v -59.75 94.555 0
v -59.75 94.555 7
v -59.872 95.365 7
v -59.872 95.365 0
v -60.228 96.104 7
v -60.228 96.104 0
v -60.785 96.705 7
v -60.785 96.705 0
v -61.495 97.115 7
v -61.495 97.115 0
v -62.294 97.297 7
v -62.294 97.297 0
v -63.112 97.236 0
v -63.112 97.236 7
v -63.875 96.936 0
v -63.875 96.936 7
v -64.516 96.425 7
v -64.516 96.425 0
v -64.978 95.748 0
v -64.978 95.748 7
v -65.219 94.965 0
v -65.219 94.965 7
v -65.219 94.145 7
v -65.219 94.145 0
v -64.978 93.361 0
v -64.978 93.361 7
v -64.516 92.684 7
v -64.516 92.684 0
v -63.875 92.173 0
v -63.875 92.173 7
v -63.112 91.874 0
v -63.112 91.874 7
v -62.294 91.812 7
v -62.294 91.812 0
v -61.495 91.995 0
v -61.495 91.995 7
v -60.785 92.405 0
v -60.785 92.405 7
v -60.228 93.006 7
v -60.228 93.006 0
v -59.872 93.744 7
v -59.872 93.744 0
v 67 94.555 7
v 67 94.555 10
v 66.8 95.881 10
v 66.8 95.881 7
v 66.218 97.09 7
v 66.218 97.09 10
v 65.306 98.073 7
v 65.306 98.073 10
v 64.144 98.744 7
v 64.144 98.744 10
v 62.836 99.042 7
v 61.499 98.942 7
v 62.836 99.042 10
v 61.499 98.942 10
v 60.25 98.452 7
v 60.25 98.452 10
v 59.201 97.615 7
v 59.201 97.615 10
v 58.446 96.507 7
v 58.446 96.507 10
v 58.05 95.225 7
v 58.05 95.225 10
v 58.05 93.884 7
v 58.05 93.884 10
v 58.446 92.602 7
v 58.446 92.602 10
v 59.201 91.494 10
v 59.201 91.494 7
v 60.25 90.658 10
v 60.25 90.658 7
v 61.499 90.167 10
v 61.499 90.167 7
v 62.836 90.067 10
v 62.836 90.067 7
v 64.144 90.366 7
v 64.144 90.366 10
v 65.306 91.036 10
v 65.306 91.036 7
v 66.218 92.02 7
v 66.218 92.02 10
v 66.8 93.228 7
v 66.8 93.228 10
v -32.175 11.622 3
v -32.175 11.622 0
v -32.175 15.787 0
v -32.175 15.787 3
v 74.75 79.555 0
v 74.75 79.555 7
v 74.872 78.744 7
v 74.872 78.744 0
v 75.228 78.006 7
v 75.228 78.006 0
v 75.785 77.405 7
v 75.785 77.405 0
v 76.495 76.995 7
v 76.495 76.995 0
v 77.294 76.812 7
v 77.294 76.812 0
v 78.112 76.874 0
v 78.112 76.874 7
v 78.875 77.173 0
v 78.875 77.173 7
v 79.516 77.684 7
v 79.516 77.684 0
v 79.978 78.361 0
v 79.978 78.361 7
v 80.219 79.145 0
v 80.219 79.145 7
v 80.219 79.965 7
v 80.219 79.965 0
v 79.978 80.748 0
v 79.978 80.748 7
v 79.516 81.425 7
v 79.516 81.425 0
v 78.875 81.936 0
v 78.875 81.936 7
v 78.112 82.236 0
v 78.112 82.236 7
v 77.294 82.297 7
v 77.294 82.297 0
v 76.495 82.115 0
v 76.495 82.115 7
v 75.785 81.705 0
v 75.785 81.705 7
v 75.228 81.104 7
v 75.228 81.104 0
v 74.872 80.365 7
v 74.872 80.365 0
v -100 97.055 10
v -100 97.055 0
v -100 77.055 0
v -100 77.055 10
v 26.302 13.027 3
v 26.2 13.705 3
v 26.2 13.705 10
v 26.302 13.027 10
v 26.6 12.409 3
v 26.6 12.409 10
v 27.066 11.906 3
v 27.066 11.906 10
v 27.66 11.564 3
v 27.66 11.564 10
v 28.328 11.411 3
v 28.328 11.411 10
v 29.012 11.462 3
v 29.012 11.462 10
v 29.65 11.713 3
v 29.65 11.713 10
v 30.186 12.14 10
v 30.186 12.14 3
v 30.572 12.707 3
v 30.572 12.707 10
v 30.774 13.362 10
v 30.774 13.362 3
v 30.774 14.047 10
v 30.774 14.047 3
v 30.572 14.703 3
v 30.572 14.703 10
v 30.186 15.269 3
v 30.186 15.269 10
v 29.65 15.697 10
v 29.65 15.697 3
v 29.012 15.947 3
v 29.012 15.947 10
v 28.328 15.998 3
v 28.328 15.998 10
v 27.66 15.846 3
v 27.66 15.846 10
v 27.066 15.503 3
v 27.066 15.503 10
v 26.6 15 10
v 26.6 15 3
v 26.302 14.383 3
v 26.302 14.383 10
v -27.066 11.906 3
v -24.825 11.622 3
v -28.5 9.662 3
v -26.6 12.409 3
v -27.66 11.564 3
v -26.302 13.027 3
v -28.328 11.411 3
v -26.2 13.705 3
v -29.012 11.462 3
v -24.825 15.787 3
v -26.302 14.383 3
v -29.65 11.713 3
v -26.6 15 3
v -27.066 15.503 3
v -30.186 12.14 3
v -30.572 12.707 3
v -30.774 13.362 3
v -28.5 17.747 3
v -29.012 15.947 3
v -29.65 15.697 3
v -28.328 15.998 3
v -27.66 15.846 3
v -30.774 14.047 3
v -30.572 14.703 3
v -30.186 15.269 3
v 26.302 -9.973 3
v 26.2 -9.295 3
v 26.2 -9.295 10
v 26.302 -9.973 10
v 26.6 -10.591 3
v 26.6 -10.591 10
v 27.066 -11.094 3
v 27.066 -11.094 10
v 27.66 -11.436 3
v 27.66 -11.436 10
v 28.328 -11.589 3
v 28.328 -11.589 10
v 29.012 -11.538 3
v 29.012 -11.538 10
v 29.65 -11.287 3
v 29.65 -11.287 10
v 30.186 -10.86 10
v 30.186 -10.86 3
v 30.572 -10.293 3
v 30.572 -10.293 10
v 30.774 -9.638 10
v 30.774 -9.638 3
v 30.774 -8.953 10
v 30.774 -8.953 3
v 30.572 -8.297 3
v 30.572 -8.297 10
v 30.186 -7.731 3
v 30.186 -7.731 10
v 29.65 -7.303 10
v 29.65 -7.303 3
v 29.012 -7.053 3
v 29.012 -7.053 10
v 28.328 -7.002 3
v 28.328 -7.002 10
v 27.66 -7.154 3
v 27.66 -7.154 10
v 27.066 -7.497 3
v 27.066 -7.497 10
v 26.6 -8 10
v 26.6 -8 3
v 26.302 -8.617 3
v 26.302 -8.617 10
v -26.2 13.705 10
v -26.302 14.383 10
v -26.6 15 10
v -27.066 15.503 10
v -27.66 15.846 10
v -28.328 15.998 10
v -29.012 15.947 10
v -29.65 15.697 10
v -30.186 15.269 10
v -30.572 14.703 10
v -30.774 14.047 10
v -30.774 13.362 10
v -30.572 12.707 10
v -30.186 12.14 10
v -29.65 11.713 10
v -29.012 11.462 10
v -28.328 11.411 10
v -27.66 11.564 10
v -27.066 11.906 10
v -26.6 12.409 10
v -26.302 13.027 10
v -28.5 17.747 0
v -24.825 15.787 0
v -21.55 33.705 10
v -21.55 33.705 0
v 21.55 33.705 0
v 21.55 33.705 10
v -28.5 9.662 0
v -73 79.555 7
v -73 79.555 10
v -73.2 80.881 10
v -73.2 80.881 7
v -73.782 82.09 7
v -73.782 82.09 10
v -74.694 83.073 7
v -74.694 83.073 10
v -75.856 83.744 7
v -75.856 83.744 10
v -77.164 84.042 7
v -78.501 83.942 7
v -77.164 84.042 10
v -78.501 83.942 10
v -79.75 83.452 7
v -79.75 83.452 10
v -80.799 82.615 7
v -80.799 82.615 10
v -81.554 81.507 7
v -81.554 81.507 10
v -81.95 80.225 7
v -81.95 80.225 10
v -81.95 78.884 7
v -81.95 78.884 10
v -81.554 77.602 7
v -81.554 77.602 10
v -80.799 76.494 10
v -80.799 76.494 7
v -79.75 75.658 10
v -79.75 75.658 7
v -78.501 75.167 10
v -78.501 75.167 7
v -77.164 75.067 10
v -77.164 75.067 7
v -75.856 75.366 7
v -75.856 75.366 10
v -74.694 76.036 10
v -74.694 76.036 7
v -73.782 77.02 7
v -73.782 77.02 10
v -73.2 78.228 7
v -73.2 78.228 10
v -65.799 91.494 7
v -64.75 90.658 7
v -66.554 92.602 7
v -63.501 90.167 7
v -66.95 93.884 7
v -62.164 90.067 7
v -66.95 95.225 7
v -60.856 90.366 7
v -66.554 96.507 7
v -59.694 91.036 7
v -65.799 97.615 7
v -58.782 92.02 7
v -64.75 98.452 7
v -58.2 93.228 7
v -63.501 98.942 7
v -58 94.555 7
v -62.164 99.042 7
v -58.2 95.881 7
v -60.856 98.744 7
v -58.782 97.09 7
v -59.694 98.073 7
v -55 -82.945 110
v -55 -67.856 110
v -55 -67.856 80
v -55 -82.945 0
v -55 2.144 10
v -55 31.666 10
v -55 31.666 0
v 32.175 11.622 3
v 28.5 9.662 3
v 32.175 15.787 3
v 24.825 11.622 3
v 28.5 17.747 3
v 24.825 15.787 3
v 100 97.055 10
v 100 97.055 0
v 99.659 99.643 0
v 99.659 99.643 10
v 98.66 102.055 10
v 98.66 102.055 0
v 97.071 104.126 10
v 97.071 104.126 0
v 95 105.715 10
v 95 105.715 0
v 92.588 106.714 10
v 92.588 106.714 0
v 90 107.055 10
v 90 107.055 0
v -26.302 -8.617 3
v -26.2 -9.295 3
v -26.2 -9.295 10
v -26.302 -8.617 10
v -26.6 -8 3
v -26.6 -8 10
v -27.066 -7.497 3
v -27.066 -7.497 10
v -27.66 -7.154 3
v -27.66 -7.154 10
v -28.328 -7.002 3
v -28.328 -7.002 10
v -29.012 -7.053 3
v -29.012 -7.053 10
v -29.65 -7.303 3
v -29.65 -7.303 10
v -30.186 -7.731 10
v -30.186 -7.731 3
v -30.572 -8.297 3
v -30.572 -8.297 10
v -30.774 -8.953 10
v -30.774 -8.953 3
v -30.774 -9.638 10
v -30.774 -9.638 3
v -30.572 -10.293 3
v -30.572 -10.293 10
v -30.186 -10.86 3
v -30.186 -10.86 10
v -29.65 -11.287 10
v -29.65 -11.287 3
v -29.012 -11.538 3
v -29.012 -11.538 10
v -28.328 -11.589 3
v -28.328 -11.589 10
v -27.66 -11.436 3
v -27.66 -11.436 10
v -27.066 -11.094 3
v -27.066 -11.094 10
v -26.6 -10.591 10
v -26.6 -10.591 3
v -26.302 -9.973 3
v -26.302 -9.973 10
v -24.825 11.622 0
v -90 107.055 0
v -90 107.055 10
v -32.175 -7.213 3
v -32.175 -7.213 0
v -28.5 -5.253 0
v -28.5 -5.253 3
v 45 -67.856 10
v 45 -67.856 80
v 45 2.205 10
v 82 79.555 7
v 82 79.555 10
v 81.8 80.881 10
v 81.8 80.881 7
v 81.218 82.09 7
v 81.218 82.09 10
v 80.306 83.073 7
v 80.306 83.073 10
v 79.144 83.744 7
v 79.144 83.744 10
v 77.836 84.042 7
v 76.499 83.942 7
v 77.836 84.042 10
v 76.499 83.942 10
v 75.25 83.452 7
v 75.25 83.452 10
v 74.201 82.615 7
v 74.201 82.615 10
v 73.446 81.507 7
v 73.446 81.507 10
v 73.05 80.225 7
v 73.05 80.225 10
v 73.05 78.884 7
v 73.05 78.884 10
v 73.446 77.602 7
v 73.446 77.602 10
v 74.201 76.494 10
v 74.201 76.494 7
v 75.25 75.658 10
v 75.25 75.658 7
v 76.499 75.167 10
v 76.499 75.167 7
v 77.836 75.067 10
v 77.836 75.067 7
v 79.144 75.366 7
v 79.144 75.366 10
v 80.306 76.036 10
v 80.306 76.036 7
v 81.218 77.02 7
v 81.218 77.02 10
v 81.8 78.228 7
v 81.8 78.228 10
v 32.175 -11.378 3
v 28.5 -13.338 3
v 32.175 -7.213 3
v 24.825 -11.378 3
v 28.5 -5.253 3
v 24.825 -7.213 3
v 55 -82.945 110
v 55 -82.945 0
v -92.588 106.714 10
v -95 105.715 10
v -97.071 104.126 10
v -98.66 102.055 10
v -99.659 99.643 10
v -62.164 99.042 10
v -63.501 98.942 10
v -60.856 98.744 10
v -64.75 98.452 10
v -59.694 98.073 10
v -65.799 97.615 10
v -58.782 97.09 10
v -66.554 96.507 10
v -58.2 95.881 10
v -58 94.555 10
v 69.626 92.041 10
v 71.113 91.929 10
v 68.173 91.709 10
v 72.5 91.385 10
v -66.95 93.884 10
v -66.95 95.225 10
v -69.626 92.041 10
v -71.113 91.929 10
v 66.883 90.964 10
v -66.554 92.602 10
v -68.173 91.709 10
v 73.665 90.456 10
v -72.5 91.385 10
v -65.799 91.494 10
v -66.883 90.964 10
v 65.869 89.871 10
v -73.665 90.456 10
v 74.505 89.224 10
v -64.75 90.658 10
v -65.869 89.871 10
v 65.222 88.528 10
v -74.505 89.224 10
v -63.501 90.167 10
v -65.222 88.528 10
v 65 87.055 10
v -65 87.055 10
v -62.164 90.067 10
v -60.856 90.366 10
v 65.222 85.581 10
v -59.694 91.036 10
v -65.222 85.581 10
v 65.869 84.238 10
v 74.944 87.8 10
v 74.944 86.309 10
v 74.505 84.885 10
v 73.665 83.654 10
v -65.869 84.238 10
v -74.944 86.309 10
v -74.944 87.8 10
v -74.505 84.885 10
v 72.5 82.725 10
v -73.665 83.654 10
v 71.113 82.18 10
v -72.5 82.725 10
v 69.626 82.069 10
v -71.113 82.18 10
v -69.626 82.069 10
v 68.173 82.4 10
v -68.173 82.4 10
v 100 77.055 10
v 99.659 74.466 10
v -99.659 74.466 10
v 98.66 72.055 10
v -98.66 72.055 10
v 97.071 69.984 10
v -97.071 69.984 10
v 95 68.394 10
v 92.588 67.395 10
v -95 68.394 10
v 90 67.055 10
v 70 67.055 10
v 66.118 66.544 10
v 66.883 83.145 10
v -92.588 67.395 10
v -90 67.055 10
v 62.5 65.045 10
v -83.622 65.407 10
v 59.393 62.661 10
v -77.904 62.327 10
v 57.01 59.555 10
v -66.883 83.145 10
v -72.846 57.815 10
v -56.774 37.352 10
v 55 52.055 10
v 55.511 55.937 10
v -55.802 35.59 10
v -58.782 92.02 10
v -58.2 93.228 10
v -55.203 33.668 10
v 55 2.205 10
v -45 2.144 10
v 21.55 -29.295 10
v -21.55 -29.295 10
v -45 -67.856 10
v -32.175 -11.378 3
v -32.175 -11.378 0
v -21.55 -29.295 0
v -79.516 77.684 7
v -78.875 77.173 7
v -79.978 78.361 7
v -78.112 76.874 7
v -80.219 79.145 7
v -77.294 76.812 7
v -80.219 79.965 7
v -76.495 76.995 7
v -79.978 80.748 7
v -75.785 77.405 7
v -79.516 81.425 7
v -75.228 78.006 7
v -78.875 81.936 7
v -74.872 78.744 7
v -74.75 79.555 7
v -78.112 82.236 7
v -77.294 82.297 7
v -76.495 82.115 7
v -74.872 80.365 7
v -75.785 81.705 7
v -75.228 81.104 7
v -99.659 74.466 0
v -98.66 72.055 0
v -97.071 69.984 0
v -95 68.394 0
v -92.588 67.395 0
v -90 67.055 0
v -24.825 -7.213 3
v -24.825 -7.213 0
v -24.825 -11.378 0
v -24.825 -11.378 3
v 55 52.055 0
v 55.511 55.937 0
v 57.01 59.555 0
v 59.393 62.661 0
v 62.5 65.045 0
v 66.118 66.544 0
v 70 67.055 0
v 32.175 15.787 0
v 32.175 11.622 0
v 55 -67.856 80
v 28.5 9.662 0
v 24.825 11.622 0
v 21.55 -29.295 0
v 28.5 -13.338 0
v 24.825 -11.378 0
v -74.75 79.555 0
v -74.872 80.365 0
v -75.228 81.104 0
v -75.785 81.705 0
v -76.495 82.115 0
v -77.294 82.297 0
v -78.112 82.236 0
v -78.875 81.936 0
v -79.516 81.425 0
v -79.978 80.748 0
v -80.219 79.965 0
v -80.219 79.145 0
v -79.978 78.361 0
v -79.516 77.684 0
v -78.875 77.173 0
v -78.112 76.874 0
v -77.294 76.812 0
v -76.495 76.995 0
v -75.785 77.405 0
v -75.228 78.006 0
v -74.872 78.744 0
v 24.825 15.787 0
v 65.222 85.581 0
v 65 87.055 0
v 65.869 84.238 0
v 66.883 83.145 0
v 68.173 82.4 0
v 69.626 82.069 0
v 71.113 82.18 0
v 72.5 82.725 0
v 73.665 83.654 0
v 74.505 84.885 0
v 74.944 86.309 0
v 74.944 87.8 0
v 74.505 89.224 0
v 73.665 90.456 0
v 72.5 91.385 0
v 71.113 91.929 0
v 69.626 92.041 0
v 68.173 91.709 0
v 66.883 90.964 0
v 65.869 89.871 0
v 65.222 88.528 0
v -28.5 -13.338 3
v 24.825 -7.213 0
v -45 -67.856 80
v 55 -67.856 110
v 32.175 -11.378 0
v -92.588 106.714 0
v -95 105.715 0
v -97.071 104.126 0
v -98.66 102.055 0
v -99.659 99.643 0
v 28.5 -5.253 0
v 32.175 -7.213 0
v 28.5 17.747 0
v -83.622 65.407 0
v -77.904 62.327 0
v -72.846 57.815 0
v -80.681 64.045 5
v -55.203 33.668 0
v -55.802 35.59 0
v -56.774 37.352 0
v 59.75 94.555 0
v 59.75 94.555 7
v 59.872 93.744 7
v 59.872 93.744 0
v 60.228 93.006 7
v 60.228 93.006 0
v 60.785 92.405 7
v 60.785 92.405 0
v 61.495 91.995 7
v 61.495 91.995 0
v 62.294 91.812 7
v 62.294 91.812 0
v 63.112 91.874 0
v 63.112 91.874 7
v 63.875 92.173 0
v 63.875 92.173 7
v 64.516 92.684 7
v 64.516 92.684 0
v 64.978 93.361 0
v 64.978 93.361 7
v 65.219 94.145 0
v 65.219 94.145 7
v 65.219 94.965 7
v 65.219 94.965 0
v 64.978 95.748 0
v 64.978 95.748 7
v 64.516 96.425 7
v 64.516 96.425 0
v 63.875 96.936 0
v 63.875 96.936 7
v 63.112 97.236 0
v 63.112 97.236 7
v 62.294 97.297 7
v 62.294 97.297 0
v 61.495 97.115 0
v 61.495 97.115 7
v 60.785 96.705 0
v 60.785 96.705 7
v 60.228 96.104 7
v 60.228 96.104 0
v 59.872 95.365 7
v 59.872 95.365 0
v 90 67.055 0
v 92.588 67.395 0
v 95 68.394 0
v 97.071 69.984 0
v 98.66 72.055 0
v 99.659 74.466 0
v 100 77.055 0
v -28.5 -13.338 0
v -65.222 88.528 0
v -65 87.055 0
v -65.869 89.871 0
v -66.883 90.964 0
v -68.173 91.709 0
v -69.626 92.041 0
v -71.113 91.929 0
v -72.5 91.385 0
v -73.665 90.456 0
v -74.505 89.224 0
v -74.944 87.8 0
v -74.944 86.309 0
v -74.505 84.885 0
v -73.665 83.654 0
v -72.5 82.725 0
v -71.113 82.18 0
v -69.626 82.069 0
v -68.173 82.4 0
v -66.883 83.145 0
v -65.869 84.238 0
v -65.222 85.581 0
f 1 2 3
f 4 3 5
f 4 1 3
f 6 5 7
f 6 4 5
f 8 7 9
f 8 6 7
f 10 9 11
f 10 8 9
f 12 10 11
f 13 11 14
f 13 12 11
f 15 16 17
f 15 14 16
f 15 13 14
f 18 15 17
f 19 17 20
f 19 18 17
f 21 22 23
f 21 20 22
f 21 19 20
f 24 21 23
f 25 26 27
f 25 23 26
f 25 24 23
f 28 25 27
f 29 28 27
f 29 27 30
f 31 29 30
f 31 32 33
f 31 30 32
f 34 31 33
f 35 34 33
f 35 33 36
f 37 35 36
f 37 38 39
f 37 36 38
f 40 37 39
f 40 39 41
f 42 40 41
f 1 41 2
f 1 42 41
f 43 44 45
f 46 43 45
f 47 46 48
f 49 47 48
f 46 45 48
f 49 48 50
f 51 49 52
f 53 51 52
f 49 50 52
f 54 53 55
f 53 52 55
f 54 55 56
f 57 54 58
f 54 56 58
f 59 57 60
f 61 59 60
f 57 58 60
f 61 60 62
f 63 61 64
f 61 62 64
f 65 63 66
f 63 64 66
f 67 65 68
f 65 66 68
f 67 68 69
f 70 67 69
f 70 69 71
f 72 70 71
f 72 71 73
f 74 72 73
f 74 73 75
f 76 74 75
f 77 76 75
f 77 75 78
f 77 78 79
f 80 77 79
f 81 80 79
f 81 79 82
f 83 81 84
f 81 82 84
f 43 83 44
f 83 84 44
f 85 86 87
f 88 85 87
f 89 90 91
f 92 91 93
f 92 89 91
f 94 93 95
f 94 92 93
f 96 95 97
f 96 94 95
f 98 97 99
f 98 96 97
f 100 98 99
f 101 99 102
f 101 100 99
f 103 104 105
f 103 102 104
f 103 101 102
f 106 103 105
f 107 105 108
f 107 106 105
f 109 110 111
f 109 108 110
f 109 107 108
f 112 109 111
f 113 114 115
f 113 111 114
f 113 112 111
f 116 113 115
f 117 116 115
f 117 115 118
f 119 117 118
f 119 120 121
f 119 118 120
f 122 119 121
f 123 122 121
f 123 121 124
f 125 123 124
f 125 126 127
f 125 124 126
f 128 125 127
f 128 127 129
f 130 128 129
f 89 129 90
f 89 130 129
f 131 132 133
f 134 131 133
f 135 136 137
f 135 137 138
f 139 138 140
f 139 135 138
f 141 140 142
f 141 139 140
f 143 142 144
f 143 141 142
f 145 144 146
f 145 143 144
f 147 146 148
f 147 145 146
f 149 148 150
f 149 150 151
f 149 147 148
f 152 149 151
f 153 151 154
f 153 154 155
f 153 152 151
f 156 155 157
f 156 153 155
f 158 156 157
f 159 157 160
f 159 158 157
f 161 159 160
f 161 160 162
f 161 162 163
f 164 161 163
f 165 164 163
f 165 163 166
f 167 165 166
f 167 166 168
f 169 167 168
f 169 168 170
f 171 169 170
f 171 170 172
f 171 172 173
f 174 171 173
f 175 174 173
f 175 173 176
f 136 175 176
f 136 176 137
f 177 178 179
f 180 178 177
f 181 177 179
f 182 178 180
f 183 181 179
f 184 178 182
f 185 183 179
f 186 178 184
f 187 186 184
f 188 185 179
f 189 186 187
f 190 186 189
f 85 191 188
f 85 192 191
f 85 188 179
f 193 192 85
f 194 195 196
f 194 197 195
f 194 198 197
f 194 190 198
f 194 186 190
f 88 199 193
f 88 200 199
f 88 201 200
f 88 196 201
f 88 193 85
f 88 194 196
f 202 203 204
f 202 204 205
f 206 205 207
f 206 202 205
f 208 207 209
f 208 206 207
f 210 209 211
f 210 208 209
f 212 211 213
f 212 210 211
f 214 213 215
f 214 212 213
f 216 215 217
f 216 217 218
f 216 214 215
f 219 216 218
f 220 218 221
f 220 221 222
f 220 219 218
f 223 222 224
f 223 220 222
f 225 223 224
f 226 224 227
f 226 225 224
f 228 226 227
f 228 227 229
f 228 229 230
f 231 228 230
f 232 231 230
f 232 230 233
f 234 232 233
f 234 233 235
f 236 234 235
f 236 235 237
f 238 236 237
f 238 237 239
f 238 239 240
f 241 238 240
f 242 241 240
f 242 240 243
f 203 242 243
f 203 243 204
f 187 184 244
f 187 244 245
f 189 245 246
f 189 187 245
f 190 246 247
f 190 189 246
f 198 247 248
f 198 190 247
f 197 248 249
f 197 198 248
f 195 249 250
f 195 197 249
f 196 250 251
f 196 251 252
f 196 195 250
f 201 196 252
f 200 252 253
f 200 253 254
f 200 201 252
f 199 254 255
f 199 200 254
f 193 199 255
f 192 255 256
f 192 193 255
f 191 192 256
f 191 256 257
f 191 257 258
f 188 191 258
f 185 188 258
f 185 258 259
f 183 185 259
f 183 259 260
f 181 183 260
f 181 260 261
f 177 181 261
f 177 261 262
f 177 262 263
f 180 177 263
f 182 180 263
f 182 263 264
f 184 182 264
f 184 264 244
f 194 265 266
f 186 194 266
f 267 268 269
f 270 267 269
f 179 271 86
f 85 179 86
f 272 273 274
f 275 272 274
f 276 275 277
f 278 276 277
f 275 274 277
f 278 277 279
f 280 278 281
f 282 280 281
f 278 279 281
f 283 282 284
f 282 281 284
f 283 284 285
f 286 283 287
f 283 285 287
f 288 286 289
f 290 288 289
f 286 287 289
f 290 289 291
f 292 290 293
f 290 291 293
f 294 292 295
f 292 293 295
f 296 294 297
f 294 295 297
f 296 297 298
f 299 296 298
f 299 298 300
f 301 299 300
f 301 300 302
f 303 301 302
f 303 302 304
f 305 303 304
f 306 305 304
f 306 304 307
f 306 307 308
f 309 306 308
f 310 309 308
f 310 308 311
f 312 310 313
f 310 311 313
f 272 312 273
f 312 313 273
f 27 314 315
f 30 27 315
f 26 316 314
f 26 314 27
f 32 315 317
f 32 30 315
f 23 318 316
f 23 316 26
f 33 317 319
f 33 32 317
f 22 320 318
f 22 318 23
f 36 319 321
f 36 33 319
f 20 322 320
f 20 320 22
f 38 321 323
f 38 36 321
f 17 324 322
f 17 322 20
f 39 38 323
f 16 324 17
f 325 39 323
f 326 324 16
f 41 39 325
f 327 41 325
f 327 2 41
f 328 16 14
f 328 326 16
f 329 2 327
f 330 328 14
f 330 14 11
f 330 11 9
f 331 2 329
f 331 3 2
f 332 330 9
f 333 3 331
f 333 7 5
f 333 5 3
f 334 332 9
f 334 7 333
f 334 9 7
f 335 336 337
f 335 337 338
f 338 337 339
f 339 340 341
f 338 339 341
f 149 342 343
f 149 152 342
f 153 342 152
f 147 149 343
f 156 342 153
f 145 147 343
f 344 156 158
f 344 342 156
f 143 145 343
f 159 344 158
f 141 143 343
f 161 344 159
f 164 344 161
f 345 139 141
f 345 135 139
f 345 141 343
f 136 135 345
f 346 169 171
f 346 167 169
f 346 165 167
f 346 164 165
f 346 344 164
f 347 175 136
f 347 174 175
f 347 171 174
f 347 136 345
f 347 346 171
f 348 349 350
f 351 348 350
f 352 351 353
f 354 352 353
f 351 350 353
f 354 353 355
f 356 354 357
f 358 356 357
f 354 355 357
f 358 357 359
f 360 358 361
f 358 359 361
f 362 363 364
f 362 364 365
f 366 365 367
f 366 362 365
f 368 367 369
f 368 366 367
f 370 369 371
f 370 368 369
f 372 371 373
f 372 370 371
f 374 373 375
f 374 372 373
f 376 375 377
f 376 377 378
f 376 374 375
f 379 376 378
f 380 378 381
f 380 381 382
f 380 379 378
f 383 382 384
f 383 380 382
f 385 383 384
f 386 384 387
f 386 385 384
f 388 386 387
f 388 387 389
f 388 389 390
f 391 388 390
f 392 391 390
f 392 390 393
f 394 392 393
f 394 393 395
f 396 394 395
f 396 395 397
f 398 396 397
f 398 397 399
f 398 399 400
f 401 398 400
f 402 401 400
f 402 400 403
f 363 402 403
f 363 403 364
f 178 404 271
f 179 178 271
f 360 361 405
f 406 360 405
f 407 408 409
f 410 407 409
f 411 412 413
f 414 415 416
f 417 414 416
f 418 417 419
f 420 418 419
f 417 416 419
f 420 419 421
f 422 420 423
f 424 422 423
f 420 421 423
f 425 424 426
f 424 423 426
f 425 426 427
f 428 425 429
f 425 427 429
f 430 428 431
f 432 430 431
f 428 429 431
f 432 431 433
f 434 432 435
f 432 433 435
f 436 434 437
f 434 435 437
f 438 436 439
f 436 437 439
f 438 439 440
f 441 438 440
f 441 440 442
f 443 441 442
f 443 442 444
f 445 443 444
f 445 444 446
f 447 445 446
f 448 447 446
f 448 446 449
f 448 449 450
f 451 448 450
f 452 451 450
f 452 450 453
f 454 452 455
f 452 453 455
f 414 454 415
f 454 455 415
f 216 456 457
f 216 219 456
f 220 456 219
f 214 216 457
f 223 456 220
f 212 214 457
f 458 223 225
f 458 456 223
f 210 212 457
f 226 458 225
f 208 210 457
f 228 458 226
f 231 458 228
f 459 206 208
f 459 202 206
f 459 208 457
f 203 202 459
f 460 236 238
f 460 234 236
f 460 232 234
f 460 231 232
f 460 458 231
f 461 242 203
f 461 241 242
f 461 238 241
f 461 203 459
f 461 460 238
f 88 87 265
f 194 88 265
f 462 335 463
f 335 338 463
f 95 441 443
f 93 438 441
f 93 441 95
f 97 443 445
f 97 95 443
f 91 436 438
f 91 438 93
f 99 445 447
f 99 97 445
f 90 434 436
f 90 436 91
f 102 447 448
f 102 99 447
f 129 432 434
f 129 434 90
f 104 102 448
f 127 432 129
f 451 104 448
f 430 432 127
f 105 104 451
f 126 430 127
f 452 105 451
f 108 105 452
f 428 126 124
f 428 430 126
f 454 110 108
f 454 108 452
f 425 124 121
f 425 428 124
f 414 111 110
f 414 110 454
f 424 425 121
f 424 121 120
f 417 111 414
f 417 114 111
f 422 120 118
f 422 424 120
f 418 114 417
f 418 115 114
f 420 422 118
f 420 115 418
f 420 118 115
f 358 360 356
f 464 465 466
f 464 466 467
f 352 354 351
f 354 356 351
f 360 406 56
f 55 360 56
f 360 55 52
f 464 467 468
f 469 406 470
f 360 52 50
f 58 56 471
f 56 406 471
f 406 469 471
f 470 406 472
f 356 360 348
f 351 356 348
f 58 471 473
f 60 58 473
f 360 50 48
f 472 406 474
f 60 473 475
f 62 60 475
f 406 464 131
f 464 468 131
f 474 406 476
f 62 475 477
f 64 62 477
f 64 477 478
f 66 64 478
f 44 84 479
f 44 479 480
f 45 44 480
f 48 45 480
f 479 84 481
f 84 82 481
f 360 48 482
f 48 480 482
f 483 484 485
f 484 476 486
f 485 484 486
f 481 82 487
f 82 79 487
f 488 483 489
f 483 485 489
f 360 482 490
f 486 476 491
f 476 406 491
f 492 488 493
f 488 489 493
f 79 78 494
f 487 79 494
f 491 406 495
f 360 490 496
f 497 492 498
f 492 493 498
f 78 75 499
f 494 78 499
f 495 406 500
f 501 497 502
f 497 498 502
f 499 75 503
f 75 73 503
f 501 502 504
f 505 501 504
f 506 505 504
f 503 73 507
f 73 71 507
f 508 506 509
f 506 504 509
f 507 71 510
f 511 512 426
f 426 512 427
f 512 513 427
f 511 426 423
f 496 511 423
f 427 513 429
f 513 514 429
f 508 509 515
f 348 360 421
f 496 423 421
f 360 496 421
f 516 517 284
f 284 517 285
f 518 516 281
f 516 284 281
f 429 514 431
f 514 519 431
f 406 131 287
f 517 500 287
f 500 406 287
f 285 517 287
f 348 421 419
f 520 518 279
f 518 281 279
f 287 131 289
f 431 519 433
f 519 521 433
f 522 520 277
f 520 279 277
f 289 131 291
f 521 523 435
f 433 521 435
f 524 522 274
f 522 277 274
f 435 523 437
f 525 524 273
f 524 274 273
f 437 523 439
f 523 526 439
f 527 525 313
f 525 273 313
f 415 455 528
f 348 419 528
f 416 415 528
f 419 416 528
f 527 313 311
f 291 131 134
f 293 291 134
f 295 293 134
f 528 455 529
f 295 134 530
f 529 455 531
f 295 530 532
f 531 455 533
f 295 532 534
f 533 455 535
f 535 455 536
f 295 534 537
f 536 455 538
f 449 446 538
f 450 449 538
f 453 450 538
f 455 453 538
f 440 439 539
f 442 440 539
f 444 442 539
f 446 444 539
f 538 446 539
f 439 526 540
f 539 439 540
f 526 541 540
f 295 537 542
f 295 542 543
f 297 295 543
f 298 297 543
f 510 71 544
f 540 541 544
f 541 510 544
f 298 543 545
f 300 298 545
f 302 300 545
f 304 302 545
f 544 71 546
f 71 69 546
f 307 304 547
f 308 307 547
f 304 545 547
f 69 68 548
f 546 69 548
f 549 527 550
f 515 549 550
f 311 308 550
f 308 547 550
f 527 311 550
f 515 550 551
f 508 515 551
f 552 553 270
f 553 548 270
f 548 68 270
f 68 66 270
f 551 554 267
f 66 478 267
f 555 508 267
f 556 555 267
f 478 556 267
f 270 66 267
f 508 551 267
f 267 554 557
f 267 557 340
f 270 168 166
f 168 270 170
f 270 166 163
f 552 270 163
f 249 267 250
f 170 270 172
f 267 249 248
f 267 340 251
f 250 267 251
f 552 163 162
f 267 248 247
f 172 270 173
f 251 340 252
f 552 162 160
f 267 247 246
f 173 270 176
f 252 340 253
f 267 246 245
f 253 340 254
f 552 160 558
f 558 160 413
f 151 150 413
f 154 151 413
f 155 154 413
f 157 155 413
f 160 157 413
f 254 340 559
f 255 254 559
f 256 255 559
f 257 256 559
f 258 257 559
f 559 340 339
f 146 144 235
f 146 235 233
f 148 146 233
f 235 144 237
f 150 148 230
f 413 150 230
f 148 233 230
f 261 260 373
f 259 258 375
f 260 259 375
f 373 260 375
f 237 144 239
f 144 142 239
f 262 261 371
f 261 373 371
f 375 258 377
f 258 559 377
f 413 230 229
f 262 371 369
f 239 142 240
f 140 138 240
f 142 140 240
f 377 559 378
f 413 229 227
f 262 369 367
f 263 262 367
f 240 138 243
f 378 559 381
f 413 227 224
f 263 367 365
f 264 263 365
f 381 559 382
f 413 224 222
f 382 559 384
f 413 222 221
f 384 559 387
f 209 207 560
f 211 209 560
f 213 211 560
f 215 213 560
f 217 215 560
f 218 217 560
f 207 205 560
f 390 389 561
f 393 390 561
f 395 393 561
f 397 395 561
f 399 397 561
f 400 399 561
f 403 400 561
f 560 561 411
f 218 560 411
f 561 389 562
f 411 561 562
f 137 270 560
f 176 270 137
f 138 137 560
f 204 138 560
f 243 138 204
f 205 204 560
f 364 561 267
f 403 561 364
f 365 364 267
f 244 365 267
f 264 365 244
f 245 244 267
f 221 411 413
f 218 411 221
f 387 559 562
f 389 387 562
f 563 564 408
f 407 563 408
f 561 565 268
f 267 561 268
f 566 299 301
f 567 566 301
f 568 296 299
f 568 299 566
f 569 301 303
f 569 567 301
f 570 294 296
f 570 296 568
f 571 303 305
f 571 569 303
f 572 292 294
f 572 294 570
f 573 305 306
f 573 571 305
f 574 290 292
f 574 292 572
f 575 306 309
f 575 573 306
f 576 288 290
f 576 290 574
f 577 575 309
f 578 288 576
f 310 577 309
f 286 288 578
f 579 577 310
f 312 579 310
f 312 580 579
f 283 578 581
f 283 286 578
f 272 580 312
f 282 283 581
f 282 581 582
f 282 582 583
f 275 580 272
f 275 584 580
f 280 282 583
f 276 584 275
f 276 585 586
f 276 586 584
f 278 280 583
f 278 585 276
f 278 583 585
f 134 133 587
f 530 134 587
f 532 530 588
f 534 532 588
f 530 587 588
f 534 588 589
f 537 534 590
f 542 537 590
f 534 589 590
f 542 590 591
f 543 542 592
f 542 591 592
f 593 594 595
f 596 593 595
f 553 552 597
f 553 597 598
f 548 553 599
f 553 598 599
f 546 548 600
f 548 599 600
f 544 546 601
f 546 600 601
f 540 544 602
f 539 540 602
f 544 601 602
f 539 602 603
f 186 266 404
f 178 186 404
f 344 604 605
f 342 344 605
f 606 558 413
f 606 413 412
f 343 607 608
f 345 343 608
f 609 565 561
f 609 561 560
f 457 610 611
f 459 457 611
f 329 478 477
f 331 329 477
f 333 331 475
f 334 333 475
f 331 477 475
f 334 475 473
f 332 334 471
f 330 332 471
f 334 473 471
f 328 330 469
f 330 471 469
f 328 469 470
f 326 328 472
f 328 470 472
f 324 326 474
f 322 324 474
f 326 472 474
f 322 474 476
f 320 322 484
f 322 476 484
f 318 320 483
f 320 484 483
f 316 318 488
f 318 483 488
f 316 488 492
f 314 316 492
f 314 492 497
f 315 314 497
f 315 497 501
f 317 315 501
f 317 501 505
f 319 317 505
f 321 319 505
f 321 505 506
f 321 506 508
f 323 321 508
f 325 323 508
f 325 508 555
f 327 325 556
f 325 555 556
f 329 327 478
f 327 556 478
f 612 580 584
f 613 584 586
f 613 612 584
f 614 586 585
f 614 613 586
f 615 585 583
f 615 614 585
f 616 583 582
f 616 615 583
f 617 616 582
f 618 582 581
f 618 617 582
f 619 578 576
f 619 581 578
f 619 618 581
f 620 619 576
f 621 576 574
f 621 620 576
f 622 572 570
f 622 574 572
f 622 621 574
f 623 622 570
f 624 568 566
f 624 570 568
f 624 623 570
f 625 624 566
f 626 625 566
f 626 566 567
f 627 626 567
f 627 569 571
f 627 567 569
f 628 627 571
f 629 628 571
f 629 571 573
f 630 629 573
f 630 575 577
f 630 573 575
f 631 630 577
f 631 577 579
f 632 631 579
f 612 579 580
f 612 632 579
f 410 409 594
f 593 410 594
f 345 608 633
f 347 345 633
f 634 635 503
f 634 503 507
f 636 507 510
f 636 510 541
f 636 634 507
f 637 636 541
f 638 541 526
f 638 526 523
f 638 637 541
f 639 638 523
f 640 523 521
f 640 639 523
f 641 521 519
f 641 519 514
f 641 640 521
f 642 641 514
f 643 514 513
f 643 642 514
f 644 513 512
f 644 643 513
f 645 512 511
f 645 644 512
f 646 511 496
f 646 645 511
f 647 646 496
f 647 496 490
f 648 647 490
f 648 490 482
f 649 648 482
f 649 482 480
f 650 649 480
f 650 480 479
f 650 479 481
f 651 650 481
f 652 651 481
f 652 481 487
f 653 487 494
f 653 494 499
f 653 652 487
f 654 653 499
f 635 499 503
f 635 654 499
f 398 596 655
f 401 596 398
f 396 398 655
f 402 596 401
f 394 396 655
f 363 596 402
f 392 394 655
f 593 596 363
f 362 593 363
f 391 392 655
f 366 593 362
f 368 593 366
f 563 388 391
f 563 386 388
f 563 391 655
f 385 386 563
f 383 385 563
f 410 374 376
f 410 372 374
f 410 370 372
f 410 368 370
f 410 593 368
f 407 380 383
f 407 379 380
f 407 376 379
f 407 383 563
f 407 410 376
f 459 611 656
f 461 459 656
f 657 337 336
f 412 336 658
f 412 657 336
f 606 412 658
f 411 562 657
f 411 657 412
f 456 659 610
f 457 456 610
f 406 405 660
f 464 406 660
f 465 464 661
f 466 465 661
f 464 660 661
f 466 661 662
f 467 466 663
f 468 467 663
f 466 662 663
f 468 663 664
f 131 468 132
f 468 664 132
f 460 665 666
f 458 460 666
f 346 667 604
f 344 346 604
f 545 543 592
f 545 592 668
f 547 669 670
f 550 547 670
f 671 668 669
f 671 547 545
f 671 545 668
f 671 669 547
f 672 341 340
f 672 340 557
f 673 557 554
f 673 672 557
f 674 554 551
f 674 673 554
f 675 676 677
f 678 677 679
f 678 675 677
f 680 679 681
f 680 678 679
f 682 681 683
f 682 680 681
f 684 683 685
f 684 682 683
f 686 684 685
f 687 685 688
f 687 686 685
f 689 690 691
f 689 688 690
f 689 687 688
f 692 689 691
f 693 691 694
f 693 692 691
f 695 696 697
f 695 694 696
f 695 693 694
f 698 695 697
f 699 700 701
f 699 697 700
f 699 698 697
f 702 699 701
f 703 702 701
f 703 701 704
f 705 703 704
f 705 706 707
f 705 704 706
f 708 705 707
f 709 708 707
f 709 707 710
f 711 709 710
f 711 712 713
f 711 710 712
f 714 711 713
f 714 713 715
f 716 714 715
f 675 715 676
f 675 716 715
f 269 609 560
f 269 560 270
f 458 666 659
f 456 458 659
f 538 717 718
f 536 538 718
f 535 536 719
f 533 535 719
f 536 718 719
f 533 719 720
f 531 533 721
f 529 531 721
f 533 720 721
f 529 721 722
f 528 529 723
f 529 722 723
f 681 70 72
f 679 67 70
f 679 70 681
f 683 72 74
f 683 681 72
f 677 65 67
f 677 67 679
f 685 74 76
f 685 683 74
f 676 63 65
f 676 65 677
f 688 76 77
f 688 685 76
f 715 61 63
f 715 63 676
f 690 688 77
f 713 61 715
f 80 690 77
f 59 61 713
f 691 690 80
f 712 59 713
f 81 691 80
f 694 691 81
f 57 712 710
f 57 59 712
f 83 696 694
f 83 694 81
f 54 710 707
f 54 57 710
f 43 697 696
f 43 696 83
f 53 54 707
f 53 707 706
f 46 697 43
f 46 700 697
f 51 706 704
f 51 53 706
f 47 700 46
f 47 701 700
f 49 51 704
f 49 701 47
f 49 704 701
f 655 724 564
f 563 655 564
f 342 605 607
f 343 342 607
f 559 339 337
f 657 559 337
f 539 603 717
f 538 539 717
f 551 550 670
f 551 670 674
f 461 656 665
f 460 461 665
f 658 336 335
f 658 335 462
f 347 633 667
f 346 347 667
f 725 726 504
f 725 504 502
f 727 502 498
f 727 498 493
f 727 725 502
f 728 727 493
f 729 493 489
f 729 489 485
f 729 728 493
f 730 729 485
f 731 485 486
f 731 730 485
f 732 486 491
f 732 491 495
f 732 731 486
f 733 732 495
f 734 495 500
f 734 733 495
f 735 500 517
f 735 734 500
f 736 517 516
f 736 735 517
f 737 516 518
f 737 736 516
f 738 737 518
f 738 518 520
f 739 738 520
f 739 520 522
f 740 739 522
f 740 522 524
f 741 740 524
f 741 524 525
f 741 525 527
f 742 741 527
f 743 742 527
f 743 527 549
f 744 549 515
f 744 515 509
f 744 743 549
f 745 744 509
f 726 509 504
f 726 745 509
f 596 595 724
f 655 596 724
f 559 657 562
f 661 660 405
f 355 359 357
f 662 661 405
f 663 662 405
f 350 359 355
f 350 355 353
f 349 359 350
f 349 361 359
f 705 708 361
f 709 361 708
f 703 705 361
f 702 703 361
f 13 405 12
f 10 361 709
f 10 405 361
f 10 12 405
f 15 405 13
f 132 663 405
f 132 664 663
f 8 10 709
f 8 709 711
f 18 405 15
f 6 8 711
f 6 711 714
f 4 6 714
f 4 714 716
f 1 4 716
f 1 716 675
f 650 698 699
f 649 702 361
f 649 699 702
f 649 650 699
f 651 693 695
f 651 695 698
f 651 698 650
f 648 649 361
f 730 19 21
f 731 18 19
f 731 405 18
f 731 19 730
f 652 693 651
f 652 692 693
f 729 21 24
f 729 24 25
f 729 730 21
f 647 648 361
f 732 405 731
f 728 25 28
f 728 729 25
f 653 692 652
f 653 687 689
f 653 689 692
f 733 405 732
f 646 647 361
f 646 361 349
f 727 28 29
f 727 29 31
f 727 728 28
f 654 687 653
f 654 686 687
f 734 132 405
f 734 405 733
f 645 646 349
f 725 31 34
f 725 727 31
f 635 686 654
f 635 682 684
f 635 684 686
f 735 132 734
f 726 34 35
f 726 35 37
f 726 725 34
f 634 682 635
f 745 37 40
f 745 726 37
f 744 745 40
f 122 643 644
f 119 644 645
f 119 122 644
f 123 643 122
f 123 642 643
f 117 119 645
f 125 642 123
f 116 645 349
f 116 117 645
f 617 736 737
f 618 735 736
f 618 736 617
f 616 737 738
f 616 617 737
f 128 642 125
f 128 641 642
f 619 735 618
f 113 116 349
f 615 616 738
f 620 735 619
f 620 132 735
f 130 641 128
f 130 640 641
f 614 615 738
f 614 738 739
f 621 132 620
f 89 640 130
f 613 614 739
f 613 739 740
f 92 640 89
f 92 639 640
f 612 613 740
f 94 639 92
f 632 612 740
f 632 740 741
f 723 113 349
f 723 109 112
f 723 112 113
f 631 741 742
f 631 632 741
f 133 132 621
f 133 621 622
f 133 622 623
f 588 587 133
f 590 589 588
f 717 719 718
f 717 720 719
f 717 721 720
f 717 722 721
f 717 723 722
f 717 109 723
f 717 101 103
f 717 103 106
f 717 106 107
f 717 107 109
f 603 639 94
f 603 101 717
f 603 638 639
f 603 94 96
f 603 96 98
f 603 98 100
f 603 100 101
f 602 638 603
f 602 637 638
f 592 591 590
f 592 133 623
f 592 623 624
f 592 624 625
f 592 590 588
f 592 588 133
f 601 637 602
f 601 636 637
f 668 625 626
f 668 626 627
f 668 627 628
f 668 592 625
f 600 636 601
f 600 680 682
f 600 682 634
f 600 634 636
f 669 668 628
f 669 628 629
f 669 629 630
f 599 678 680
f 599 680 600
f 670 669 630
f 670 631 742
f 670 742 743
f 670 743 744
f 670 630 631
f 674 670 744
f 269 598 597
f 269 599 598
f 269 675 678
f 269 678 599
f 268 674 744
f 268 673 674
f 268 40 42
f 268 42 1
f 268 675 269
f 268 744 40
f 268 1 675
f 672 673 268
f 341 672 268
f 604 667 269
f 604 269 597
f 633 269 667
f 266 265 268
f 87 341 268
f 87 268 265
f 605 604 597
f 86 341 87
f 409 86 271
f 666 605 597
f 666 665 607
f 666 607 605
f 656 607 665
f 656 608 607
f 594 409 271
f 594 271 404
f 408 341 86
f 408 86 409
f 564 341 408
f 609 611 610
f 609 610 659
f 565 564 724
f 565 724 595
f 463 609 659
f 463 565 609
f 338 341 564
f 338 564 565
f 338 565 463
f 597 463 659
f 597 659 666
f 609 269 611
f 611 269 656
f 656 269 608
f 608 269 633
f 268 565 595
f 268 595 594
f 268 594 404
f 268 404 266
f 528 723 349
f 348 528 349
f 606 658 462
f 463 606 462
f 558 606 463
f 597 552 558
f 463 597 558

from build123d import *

# Parameters (mm, degrees)
SKIZZE1_R                       = 2.3
SKIZZE1_R_2                     = 5
SKIZZE1_R_3                     = 2.75
SKIZZE1_W                       = 43.1
SKIZZE1_H                       = 63
AUFSATZ_LINEAR_AUSTRAGEN1_DEPTH = 10
AUFSATZ_LINEAR_AUSTRAGEN3_DEPTH = 10
SKIZZE4_W                       = 110
SKIZZE4_H                       = 15.089693508
AUFSATZ_LINEAR_AUSTRAGEN4_DEPTH = 100
VERRUNDUNG5_R                   = 10
SKIZZE11_R                      = 4.5
SCHNITT_LINEAR_AUSTRAGEN1_DEPTH = 3
SCHNITT_LINEAR_AUSTRAGEN2_DEPTH = 3
AUFSATZ_LINEAR_AUSTRAGEN7_DEPTH = 10
AUFSATZ_LINEAR_AUSTRAGEN8_DEPTH = 10


with BuildPart() as part:
    # Skizze1 → Aufsatz-Linear austragen1 (new body)
    with BuildSketch(Plane.XY):
        with BuildLine():
            Line((90, 107.054645521), (-90, 107.054645521))
            ThreePointArc((-90, 107.054645521), (-97.071067812, 104.125713333), (-100, 97.054645521))
            Line((-100, 97.054645521), (-100, 77.054645521))
            ThreePointArc((-100, 77.054645521), (-97.071067812, 69.983577709), (-90, 67.054645521))
            Line((-90, 67.054645521), (-70, 67.054645521))
            ThreePointArc((-70, 67.054645521), (-59.393398282, 62.661247239), (-55, 52.054645521))
            Line((-55, 52.054645521), (-55, -82.945354479))
            Line((-55, -82.945354479), (55, -82.945354479))
            Line((55, -82.945354479), (55, 52.054645521))
            ThreePointArc((55, 52.054645521), (59.393398282, 62.661247239), (70, 67.054645521))
            Line((70, 67.054645521), (90, 67.054645521))
            ThreePointArc((90, 67.054645521), (97.071067812, 69.983577709), (100, 77.054645521))
            Line((100, 77.054645521), (100, 97.054645521))
            ThreePointArc((100, 97.054645521), (97.071067812, 104.125713333), (90, 107.054645521))
        make_face()
        with Locations((-28.5, 13.704645521)):
            Circle(SKIZZE1_R, mode=Mode.SUBTRACT)
        with Locations((-28.5, -9.295354479)):
            Circle(SKIZZE1_R, mode=Mode.SUBTRACT)
        with Locations(Location((28.5, -9.295354479, 0), (0, 0, 180))):
            Circle(SKIZZE1_R, mode=Mode.SUBTRACT)
        with Locations(Location((28.5, 13.704645521, 0), (0, 0, 180))):
            Circle(SKIZZE1_R, mode=Mode.SUBTRACT)
        with Locations((-70, 87.054645521)):
            Circle(SKIZZE1_R_2, mode=Mode.SUBTRACT)
        with Locations((-62.5, 94.554645521)):
            Circle(SKIZZE1_R_3, mode=Mode.SUBTRACT)
        with Locations((-77.5, 79.554645521)):
            Circle(SKIZZE1_R_3, mode=Mode.SUBTRACT)
        with Locations(Location((77.5, 79.554645521, 0), (0, 0, 180))):
            Circle(SKIZZE1_R_3, mode=Mode.SUBTRACT)
        with Locations(Location((62.5, 94.554645521, 0), (0, 0, 180))):
            Circle(SKIZZE1_R_3, mode=Mode.SUBTRACT)
        with Locations(Location((70, 87.054645521, 0), (0, 0, 180))):
            Circle(SKIZZE1_R_2, mode=Mode.SUBTRACT)
        with Locations((0, 2.204645521)):
            Rectangle(SKIZZE1_W, SKIZZE1_H, mode=Mode.SUBTRACT)
    extrude(amount=AUFSATZ_LINEAR_AUSTRAGEN1_DEPTH)

    # Skizze3 → Aufsatz-Linear austragen3 (add)
    with BuildSketch(Plane.XY.offset(10)):
        with BuildLine():
            Line((-72.845922337, 57.814606503), (-56.774282723, 37.352261221))
            add(Edge.make_bspline(
                [(-55, 18.961003518), (-46.636539725, 27.963101216), (-56.774282723, 37.352261221)],
                knots=[0, 0, 0, 1, 1, 1], degree=2))
            Line((-55, 18.961003518), (-43.333440031, 21.200490786))
            Line((-43.333440031, 21.200490786), (-45.498025685, 67.054645521))
            Line((-45.498025685, 67.054645521), (-90, 67.054645521))
            add(Edge.make_bspline(
                [(-90, 67.054645521), (-79.938268155, 65.656359823), (-72.845922337, 57.814606503)],
                knots=[0, 0, 0, 1, 1, 1], degree=2))
        make_face()
    extrude(amount=-AUFSATZ_LINEAR_AUSTRAGEN3_DEPTH)

    # Skizze4 → Aufsatz-Linear austragen4 (add)
    with BuildSketch(Plane.XY.offset(10)):
        with Locations((0, -75.400507725)):
            Rectangle(SKIZZE4_W, SKIZZE4_H)
    extrude(amount=AUFSATZ_LINEAR_AUSTRAGEN4_DEPTH)

    # Verrundung5
    # the kernel refuses this fillet: 10 mm, written as the material it adds along each edge
    with BuildSketch(Plane(origin=(-55, 35.554962551, 0), x_dir=(-0.702535464065595, 0.7116487347913572, 0), z_dir=(0, 0, 1))) as verrundung5_piece_1:
        with BuildLine():
            CenterArc((4.257528526, 9.848869082), VERRUNDUNG5_R, 225.36921974, 34.65693161)
            Line((-2.767826115, 2.732381734), (-2.908333207, 2.590051987))
            Line((-2.908333207, 2.590051987), (-0.140507093, -0.142329747))
            Line((-0.140507093, -0.142329747), (-0.009856246, -0.199756988))
            ThreePointArc((-0.009856246, -0.199756988), (1.263031351, -0.229630028), (2.490902127, -0.196977382))
            Line((2.490902127, -0.196977382), (2.52554186, 0))
        make_face()
    extrude(amount=10)

    # Skizze11 → Schnitt-Linear austragen1 (cut)
    with BuildSketch(Plane.XY.offset(10)):
        with Locations((62.5, 94.554645521)):
            Circle(SKIZZE11_R)
        with Locations((77.5, 79.554645521)):
            Circle(SKIZZE11_R)
        with Locations((-62.5, 94.554645521)):
            Circle(SKIZZE11_R)
        with Locations((-77.5, 79.554645521)):
            Circle(SKIZZE11_R)
    extrude(amount=-SCHNITT_LINEAR_AUSTRAGEN1_DEPTH, mode=Mode.SUBTRACT)

    # Skizze12 → Schnitt-Linear austragen2 (cut)
    with BuildSketch(Plane(origin=(0, 0, 0), x_dir=(-1, 0, 0), z_dir=(0, 0, -1))):
        Polygon((28.5, 17.747145521), (24.825, 15.787145521), (24.825, 11.622145521), (28.5, 9.662145521), (32.175, 11.622145521), (32.175, 15.787145521), align=None)
        Polygon((28.5, -5.252854479), (24.825, -7.212854479), (24.825, -11.377854479), (28.5, -13.337854479), (32.175, -11.377854479), (32.175, -7.212854479), align=None)
        Polygon((-28.5, -5.252854479), (-32.175, -7.212854479), (-32.175, -11.377854479), (-28.5, -13.337854479), (-24.825, -11.377854479), (-24.825, -7.212854479), align=None)
        Polygon((-28.5, 17.747145521), (-32.175, 15.787145521), (-32.175, 11.622145521), (-28.5, 9.662145521), (-24.825, 11.622145521), (-24.825, 15.787145521), align=None)
    extrude(amount=-SCHNITT_LINEAR_AUSTRAGEN2_DEPTH, mode=Mode.SUBTRACT)

    # Skizze15 → Aufsatz-Linear austragen7 (add)
    with BuildSketch(Plane.ZY.offset(55)):
        Polygon((10, 2.144339029), (80, -67.855660971), (10, -67.855660971), align=None)
    extrude(amount=-AUFSATZ_LINEAR_AUSTRAGEN7_DEPTH)

    # Skizze16 → Aufsatz-Linear austragen8 (add)
    with BuildSketch(Plane(origin=(55, 0, 0), x_dir=(0, 0, -1), z_dir=(1, 0, 0))):
        Polygon((-10, 2.204645521), (-80, -67.855660971), (-10, -67.855660971), align=None)
    extrude(amount=-AUFSATZ_LINEAR_AUSTRAGEN8_DEPTH)


solid = part.part
